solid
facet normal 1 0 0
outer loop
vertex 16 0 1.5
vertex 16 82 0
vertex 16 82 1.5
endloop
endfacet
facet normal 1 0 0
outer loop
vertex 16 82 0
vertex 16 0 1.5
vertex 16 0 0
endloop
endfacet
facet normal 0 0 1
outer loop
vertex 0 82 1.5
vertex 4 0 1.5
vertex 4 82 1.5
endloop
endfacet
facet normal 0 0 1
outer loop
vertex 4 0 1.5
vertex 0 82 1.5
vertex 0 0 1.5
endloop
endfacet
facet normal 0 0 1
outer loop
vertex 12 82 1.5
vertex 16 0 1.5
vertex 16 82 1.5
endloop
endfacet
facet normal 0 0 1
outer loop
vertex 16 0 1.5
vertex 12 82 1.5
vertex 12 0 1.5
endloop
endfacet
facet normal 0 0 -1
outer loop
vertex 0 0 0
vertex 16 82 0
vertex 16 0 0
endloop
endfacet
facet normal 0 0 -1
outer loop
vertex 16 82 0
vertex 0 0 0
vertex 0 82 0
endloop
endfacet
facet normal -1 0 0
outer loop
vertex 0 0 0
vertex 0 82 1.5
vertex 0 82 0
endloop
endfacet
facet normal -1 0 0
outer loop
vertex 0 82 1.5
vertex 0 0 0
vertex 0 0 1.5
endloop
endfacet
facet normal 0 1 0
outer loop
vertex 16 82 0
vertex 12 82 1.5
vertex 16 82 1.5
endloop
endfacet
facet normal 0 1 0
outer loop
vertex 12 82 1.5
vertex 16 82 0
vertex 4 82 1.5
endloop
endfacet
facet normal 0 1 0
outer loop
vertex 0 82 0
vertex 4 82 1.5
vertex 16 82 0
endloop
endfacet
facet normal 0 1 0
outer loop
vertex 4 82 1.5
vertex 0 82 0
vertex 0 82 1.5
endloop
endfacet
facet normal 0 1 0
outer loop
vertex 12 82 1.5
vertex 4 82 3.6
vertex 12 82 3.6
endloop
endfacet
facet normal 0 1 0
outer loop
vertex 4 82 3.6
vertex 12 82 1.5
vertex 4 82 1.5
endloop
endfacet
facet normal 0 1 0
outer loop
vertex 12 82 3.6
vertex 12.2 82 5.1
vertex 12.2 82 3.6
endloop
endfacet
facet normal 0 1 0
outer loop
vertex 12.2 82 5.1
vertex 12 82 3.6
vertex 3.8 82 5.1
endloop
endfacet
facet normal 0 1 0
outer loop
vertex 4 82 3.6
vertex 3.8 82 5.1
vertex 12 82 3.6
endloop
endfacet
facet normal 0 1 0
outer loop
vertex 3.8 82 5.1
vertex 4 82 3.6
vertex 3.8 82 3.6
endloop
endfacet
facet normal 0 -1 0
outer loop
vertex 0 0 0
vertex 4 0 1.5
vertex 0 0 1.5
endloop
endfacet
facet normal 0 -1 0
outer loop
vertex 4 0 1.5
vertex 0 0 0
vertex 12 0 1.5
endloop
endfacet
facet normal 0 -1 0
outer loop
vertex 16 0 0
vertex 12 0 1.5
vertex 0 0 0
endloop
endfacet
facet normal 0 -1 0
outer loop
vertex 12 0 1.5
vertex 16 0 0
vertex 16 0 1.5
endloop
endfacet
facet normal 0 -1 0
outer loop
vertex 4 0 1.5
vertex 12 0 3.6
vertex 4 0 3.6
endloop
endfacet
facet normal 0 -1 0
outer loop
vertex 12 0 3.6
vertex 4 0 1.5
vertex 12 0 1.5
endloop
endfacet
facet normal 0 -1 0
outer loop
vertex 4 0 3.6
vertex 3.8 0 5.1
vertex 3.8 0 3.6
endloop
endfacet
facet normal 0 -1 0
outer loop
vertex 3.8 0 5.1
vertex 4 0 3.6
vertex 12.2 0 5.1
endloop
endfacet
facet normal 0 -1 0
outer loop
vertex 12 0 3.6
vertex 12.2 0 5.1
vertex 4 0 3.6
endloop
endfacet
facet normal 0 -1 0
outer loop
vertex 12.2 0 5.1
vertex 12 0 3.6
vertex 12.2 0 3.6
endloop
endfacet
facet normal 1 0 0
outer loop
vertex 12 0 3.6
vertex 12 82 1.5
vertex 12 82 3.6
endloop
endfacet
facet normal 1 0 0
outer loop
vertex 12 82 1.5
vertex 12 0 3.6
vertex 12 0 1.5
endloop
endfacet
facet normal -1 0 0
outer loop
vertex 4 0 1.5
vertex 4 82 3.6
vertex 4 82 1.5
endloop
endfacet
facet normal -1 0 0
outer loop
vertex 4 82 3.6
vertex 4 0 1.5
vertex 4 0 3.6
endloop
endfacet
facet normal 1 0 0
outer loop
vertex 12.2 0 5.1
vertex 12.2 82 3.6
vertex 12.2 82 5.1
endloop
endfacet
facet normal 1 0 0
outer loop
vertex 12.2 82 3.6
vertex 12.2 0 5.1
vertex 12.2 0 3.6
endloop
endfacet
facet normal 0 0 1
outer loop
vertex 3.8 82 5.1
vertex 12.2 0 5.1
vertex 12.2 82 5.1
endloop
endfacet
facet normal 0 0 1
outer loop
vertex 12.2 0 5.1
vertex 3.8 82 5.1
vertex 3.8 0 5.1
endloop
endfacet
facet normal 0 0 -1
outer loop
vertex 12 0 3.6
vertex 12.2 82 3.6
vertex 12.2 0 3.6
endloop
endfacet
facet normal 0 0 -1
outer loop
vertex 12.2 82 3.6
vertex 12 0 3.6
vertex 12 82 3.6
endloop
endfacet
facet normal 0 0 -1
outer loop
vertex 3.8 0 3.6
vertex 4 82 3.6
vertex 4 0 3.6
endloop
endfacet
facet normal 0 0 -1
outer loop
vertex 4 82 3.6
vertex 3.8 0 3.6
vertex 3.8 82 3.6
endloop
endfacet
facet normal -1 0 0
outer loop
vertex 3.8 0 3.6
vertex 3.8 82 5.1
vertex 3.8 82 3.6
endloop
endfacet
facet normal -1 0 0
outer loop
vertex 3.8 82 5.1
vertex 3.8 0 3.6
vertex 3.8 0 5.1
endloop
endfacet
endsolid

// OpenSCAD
lun=82;
cube([16,lun,1.5]);

translate([4,0,1.5]) cube([8,lun,2.4]);
translate([3.8,0,3.6]) cube([8.4,lun,1.5]);
